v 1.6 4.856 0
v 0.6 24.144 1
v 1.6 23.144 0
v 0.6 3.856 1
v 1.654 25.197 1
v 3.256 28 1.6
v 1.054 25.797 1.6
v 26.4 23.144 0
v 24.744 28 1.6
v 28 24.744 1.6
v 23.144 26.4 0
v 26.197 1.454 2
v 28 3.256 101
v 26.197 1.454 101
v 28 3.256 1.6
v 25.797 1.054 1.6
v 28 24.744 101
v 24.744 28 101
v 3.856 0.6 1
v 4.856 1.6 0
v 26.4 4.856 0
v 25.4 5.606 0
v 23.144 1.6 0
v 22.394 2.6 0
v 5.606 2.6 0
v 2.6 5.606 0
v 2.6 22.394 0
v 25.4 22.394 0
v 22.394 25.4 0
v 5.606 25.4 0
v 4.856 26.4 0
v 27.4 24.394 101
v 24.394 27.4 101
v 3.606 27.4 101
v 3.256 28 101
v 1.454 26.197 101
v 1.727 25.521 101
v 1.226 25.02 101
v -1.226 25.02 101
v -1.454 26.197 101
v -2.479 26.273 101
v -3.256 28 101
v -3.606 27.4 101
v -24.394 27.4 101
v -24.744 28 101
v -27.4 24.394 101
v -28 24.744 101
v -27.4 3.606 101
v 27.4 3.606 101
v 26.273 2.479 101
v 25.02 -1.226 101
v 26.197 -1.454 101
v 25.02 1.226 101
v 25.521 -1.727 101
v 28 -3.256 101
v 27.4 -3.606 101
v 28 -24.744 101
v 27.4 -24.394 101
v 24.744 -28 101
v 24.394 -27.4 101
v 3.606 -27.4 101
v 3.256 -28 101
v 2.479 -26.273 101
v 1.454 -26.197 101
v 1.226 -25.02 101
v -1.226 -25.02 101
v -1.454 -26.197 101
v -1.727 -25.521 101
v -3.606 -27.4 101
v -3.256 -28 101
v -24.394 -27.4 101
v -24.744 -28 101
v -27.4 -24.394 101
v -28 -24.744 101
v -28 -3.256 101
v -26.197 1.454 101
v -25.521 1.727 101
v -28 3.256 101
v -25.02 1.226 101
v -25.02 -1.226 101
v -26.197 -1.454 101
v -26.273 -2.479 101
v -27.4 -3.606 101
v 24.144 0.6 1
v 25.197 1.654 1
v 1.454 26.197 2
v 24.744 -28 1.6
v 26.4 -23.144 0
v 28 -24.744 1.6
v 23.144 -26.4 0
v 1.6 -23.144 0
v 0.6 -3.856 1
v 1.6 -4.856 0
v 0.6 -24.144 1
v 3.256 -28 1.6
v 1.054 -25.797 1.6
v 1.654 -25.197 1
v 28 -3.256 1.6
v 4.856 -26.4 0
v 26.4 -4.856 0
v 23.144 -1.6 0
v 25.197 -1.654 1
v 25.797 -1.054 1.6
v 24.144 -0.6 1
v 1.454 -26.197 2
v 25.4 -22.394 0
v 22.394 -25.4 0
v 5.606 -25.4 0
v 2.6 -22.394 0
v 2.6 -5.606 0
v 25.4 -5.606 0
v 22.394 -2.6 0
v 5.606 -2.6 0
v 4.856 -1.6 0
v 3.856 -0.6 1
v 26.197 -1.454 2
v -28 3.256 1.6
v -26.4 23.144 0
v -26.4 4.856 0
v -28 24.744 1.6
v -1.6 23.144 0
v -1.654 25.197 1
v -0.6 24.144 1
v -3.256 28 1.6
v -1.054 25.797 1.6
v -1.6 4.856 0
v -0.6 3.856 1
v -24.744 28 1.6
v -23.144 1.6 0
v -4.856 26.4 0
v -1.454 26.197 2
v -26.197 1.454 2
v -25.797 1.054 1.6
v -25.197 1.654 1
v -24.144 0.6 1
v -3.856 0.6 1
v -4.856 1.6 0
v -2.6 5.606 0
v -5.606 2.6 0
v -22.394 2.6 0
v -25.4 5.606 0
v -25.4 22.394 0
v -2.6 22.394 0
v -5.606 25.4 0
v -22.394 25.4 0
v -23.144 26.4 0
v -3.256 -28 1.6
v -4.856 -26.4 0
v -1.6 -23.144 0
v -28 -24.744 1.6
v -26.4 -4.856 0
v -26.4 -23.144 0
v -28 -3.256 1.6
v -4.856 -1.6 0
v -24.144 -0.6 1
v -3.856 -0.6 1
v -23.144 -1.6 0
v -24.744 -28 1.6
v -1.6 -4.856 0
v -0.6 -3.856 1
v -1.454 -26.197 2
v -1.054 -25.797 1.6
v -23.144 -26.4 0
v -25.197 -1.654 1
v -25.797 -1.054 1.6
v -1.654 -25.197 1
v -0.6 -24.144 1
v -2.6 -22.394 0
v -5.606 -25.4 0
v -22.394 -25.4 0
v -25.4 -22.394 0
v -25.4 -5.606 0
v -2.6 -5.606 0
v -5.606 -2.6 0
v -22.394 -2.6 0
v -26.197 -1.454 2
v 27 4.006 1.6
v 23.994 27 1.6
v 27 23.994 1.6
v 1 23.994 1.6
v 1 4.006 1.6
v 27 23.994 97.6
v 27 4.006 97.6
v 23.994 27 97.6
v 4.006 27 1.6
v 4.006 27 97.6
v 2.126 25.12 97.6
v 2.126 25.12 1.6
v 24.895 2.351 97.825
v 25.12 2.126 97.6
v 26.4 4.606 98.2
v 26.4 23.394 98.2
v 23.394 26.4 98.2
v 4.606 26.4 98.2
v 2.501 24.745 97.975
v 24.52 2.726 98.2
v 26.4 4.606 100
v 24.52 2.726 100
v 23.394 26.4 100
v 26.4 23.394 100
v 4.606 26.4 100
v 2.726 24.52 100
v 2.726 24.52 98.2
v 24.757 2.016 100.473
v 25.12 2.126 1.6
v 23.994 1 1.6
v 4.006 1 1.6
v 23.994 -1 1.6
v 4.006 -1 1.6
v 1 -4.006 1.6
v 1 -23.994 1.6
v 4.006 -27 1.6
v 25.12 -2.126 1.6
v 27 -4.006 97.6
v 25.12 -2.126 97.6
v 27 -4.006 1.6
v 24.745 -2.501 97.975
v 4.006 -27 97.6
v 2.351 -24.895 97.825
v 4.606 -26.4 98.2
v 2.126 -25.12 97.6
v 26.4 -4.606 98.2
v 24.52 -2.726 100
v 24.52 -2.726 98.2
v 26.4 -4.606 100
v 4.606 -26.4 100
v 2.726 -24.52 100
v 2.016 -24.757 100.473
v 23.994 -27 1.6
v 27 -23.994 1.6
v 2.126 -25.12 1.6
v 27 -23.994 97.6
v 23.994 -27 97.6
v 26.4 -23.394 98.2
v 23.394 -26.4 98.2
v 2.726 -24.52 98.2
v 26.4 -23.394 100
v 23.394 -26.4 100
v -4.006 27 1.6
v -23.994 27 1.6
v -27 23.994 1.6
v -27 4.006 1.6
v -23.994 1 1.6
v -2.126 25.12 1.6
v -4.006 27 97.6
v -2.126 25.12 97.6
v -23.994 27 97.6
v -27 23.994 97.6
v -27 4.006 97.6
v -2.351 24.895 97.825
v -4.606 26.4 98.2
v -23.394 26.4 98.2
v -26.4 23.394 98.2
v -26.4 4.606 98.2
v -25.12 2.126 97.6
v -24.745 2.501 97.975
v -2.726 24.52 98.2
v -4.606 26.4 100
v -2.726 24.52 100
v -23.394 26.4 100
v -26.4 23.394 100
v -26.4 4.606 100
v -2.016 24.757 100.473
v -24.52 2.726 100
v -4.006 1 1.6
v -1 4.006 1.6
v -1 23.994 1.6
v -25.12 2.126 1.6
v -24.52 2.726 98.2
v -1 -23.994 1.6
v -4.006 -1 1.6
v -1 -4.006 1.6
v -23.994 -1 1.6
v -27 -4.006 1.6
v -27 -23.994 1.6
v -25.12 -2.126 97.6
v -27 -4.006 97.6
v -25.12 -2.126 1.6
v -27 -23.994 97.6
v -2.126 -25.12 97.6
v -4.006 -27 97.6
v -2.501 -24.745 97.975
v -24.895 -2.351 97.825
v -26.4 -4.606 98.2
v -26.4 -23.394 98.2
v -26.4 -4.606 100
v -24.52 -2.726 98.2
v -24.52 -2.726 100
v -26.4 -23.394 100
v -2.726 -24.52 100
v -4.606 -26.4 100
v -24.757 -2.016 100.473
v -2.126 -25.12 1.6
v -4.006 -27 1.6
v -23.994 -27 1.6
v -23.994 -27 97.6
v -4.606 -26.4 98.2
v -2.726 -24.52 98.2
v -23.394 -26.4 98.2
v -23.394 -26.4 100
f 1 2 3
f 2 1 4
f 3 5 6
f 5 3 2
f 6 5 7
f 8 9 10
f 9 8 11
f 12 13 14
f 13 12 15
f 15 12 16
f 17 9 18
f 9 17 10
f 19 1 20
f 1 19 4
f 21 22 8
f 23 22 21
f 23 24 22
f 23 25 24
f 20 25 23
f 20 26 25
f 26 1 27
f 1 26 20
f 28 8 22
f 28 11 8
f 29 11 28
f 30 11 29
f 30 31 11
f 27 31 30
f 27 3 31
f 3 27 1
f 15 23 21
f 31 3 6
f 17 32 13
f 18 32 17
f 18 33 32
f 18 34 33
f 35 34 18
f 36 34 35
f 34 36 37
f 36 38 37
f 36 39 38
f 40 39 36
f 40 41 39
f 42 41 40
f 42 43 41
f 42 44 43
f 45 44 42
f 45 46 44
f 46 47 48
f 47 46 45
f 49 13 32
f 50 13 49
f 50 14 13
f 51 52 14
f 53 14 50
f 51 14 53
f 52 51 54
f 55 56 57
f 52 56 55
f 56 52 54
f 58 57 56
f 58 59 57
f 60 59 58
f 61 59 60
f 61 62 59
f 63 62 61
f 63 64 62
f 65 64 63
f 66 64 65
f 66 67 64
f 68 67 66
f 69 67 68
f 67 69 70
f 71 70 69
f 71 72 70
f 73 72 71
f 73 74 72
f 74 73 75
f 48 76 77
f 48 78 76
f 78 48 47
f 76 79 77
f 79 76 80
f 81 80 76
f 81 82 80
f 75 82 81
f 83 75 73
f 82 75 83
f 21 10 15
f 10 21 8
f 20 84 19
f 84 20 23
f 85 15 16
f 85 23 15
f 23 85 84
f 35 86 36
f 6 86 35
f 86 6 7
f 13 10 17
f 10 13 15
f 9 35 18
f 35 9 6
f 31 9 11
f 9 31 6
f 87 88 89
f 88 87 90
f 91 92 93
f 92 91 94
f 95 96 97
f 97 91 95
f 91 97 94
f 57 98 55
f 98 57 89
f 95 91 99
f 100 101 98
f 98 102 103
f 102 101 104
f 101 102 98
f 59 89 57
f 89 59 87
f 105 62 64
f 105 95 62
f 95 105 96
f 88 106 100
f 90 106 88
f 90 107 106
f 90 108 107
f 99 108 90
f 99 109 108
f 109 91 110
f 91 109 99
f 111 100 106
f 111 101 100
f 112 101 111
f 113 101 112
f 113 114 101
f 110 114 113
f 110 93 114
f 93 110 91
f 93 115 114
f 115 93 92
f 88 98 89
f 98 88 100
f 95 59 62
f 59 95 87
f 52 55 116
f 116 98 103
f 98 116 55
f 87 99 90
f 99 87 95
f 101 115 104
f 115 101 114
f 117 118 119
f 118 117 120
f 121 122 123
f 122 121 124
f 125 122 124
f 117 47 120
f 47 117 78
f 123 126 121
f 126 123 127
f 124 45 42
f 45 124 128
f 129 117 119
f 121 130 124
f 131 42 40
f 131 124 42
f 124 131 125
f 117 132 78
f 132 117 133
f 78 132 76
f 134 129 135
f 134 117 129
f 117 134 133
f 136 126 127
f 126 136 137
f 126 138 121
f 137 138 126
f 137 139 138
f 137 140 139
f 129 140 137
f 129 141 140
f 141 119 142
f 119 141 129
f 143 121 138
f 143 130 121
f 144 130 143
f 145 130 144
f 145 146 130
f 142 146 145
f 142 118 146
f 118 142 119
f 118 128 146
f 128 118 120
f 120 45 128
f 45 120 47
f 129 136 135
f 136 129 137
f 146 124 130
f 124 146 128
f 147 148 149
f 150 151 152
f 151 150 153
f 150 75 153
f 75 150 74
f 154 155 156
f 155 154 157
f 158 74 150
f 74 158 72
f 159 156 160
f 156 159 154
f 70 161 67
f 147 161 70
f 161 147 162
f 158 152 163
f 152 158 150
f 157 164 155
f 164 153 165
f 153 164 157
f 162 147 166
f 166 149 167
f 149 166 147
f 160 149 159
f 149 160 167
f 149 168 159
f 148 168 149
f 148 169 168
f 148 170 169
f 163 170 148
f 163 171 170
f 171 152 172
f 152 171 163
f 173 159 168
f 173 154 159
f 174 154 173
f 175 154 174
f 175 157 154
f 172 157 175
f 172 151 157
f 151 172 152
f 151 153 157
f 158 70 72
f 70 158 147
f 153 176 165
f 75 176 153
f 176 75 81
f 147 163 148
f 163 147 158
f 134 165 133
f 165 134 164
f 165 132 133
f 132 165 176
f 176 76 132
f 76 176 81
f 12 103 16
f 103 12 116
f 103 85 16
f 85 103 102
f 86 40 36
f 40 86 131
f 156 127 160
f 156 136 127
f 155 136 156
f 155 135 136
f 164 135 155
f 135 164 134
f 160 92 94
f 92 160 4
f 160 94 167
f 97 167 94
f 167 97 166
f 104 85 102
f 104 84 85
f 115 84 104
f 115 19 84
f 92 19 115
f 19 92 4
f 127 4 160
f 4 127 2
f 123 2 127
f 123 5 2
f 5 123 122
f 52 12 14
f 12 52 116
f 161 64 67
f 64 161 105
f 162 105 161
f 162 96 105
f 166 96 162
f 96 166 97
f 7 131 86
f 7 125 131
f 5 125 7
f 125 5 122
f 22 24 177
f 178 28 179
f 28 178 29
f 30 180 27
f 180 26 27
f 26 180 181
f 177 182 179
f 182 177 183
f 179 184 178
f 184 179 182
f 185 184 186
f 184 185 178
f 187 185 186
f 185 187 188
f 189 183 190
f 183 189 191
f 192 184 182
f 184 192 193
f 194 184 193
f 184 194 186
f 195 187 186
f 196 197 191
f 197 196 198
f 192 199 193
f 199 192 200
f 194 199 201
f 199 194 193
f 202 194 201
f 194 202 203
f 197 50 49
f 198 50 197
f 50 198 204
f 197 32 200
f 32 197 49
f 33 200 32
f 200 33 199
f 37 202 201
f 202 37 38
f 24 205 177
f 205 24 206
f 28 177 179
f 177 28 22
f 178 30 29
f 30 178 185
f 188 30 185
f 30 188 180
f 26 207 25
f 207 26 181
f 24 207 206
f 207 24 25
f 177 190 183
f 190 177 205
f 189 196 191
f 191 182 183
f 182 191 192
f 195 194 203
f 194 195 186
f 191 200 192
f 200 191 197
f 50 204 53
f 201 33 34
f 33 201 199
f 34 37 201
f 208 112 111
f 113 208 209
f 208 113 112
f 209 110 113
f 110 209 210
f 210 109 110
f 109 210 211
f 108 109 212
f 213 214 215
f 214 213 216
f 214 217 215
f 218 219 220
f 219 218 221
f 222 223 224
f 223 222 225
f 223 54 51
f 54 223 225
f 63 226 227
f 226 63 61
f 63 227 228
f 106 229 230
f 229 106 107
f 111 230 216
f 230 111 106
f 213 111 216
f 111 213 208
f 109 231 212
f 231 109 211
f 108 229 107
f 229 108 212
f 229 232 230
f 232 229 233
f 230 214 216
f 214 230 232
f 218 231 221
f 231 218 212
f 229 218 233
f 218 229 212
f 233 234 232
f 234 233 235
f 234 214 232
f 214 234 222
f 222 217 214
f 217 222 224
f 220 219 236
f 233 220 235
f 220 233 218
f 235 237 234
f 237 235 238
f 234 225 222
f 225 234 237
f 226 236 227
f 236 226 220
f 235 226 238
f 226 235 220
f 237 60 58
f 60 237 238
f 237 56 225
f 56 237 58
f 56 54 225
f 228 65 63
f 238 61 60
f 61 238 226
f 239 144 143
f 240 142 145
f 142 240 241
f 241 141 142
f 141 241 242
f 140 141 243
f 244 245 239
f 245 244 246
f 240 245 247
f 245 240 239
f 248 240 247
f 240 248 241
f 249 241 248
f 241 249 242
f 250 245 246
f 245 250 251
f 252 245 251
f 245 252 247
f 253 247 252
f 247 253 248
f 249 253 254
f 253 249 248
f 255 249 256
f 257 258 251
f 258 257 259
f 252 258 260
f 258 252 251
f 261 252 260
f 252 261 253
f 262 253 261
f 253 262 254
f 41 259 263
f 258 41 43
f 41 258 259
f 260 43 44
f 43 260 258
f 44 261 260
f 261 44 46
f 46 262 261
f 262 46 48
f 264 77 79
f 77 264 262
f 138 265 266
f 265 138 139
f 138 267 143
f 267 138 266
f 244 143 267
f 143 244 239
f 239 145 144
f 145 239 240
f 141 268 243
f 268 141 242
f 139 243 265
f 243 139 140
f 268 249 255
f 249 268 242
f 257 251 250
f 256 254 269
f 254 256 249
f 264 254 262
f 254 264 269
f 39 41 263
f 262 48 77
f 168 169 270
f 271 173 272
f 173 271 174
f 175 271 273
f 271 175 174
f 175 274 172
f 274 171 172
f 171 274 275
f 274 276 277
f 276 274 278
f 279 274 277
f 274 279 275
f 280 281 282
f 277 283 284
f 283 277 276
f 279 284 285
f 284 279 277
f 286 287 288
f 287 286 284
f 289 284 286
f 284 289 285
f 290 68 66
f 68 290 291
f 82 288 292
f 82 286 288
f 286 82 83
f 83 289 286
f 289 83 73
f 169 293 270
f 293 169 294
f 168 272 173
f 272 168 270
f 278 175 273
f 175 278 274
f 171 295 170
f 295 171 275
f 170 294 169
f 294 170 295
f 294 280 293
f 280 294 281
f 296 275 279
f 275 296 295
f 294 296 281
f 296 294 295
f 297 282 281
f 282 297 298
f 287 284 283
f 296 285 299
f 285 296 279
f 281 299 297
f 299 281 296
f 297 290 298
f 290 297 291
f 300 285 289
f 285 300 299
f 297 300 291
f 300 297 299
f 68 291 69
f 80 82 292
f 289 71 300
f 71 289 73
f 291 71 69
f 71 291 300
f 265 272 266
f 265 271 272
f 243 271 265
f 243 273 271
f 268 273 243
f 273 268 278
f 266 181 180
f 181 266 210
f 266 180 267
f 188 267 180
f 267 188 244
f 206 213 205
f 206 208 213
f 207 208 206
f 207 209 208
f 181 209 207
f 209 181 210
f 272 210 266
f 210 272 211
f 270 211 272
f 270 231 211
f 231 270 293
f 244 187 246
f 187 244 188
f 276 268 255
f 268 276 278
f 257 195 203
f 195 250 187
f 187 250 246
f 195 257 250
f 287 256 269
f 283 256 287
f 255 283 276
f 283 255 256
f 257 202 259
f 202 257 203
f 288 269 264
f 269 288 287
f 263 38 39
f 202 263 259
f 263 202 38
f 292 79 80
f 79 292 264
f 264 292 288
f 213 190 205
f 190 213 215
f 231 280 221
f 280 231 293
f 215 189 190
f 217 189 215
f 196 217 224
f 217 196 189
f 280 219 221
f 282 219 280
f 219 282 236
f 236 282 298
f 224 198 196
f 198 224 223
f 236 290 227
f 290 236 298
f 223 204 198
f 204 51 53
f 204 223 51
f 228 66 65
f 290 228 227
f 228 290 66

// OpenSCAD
// Reduced 2x2 OpenGrid bin: outer - cells - hull, built from explicit slices.
// The hull's bottom plane is exactly at the cell cutters' 45-degree crease.
$fn = 16;

cw = 4.81838 - (4.81838 - 0.4) / sqrt(2) / 2;
cell_c = cw - 0.25;
hull_c = cw - 1;
outer_center = 56 - 1 - cw * sqrt(2);
hull_base = 56 - 2 - cw * 2 / sqrt(3);

function rev(v) = [for (i = [0 : len(v) - 1]) v[len(v) - 1 - i]];

function crect(base, chamfer) = [
    [ base[0]/2 - chamfer, -base[1]/2],
    [ base[0]/2, -base[1]/2 + chamfer],
    [ base[0]/2,  base[1]/2 - chamfer],
    [ base[0]/2 - chamfer,  base[1]/2],
    [-base[0]/2 + chamfer,  base[1]/2],
    [-base[0]/2,  base[1]/2 - chamfer],
    [-base[0]/2, -base[1]/2 + chamfer],
    [-base[0]/2 + chamfer, -base[1]/2]
];

module sweep(slices) {
    n = len(slices);
    pp = 8;
    points = [
        for (s = slices)
            for (p = crect([s[1], s[2]], s[3]))
                [p[0], p[1], s[0]]
    ];
    bottom = rev([for (i = [0 : pp - 1]) i]);
    top_start = (n - 1) * pp;
    top = [for (i = [0 : pp - 1]) top_start + i];
    sides = concat(
        [for (i = [0 : n - 2]) for (j = [0 : pp - 1])
            [i*pp + j, i*pp + (j + 1) % pp, (i + 1)*pp + (j + 1) % pp]],
        [for (i = [0 : n - 2]) for (j = [0 : pp - 1])
            [i*pp + j, (i + 1)*pp + (j + 1) % pp, (i + 1)*pp + j]]
    );
    faces = [for (f = concat([bottom], [top], sides)) rev(f)];
    polyhedron(points = points, faces = faces, convexity = 10);
}

module corner_prism() {
    sweep([[0, 24.8, 24.8, cw], [1.6, 28, 28, cw], [101, 28, 28, cw]]);
}

module center_prism() {
    sweep([
        [1, outer_center, outer_center, cw],
        [2, outer_center + 2, outer_center + 2, cw],
        [101, outer_center + 2, outer_center + 2, cw]
    ]);
}

module outer() {
    translate([14, 14, 0]) corner_prism();
    translate([14, -14, 0]) corner_prism();
    translate([-14, 14, 0]) corner_prism();
    translate([-14, -14, 0]) corner_prism();
    center_prism();
}

module cell() {
    sweep([
        [0, 22.8, 22.8, cell_c],
        [1.6, 26, 26, cell_c],
        [97.6, 26, 26, cell_c],
        [98.2, 24.8, 24.8, cell_c],
        [100, 24.8, 24.8, cell_c],
        [101.6, 28, 28, cell_c],
        [102.6, 28, 28, cell_c]
    ]);
}

module cells() {
    translate([14, 14, 0]) cell();
    translate([14, -14, 0]) cell();
    translate([-14, 14, 0]) cell();
    translate([-14, -14, 0]) cell();
}

module hullcut() {
    translate([0, 0, 1.6])
    sweep([
        [0, hull_base, hull_base, hull_c],
        [96, hull_base, hull_base, hull_c],
        [96.6, hull_base - 1.2, hull_base - 1.2, hull_c],
        [98.4, hull_base - 1.2, hull_base - 1.2, hull_c],
        [100, hull_base + 0.4, hull_base + 0.4, hull_c],
        [101, hull_base + 0.4, hull_base + 0.4, hull_c]
    ]);
}

render()
difference() {
    difference() {
        outer();
        cells();
    }
    hullcut();
}
